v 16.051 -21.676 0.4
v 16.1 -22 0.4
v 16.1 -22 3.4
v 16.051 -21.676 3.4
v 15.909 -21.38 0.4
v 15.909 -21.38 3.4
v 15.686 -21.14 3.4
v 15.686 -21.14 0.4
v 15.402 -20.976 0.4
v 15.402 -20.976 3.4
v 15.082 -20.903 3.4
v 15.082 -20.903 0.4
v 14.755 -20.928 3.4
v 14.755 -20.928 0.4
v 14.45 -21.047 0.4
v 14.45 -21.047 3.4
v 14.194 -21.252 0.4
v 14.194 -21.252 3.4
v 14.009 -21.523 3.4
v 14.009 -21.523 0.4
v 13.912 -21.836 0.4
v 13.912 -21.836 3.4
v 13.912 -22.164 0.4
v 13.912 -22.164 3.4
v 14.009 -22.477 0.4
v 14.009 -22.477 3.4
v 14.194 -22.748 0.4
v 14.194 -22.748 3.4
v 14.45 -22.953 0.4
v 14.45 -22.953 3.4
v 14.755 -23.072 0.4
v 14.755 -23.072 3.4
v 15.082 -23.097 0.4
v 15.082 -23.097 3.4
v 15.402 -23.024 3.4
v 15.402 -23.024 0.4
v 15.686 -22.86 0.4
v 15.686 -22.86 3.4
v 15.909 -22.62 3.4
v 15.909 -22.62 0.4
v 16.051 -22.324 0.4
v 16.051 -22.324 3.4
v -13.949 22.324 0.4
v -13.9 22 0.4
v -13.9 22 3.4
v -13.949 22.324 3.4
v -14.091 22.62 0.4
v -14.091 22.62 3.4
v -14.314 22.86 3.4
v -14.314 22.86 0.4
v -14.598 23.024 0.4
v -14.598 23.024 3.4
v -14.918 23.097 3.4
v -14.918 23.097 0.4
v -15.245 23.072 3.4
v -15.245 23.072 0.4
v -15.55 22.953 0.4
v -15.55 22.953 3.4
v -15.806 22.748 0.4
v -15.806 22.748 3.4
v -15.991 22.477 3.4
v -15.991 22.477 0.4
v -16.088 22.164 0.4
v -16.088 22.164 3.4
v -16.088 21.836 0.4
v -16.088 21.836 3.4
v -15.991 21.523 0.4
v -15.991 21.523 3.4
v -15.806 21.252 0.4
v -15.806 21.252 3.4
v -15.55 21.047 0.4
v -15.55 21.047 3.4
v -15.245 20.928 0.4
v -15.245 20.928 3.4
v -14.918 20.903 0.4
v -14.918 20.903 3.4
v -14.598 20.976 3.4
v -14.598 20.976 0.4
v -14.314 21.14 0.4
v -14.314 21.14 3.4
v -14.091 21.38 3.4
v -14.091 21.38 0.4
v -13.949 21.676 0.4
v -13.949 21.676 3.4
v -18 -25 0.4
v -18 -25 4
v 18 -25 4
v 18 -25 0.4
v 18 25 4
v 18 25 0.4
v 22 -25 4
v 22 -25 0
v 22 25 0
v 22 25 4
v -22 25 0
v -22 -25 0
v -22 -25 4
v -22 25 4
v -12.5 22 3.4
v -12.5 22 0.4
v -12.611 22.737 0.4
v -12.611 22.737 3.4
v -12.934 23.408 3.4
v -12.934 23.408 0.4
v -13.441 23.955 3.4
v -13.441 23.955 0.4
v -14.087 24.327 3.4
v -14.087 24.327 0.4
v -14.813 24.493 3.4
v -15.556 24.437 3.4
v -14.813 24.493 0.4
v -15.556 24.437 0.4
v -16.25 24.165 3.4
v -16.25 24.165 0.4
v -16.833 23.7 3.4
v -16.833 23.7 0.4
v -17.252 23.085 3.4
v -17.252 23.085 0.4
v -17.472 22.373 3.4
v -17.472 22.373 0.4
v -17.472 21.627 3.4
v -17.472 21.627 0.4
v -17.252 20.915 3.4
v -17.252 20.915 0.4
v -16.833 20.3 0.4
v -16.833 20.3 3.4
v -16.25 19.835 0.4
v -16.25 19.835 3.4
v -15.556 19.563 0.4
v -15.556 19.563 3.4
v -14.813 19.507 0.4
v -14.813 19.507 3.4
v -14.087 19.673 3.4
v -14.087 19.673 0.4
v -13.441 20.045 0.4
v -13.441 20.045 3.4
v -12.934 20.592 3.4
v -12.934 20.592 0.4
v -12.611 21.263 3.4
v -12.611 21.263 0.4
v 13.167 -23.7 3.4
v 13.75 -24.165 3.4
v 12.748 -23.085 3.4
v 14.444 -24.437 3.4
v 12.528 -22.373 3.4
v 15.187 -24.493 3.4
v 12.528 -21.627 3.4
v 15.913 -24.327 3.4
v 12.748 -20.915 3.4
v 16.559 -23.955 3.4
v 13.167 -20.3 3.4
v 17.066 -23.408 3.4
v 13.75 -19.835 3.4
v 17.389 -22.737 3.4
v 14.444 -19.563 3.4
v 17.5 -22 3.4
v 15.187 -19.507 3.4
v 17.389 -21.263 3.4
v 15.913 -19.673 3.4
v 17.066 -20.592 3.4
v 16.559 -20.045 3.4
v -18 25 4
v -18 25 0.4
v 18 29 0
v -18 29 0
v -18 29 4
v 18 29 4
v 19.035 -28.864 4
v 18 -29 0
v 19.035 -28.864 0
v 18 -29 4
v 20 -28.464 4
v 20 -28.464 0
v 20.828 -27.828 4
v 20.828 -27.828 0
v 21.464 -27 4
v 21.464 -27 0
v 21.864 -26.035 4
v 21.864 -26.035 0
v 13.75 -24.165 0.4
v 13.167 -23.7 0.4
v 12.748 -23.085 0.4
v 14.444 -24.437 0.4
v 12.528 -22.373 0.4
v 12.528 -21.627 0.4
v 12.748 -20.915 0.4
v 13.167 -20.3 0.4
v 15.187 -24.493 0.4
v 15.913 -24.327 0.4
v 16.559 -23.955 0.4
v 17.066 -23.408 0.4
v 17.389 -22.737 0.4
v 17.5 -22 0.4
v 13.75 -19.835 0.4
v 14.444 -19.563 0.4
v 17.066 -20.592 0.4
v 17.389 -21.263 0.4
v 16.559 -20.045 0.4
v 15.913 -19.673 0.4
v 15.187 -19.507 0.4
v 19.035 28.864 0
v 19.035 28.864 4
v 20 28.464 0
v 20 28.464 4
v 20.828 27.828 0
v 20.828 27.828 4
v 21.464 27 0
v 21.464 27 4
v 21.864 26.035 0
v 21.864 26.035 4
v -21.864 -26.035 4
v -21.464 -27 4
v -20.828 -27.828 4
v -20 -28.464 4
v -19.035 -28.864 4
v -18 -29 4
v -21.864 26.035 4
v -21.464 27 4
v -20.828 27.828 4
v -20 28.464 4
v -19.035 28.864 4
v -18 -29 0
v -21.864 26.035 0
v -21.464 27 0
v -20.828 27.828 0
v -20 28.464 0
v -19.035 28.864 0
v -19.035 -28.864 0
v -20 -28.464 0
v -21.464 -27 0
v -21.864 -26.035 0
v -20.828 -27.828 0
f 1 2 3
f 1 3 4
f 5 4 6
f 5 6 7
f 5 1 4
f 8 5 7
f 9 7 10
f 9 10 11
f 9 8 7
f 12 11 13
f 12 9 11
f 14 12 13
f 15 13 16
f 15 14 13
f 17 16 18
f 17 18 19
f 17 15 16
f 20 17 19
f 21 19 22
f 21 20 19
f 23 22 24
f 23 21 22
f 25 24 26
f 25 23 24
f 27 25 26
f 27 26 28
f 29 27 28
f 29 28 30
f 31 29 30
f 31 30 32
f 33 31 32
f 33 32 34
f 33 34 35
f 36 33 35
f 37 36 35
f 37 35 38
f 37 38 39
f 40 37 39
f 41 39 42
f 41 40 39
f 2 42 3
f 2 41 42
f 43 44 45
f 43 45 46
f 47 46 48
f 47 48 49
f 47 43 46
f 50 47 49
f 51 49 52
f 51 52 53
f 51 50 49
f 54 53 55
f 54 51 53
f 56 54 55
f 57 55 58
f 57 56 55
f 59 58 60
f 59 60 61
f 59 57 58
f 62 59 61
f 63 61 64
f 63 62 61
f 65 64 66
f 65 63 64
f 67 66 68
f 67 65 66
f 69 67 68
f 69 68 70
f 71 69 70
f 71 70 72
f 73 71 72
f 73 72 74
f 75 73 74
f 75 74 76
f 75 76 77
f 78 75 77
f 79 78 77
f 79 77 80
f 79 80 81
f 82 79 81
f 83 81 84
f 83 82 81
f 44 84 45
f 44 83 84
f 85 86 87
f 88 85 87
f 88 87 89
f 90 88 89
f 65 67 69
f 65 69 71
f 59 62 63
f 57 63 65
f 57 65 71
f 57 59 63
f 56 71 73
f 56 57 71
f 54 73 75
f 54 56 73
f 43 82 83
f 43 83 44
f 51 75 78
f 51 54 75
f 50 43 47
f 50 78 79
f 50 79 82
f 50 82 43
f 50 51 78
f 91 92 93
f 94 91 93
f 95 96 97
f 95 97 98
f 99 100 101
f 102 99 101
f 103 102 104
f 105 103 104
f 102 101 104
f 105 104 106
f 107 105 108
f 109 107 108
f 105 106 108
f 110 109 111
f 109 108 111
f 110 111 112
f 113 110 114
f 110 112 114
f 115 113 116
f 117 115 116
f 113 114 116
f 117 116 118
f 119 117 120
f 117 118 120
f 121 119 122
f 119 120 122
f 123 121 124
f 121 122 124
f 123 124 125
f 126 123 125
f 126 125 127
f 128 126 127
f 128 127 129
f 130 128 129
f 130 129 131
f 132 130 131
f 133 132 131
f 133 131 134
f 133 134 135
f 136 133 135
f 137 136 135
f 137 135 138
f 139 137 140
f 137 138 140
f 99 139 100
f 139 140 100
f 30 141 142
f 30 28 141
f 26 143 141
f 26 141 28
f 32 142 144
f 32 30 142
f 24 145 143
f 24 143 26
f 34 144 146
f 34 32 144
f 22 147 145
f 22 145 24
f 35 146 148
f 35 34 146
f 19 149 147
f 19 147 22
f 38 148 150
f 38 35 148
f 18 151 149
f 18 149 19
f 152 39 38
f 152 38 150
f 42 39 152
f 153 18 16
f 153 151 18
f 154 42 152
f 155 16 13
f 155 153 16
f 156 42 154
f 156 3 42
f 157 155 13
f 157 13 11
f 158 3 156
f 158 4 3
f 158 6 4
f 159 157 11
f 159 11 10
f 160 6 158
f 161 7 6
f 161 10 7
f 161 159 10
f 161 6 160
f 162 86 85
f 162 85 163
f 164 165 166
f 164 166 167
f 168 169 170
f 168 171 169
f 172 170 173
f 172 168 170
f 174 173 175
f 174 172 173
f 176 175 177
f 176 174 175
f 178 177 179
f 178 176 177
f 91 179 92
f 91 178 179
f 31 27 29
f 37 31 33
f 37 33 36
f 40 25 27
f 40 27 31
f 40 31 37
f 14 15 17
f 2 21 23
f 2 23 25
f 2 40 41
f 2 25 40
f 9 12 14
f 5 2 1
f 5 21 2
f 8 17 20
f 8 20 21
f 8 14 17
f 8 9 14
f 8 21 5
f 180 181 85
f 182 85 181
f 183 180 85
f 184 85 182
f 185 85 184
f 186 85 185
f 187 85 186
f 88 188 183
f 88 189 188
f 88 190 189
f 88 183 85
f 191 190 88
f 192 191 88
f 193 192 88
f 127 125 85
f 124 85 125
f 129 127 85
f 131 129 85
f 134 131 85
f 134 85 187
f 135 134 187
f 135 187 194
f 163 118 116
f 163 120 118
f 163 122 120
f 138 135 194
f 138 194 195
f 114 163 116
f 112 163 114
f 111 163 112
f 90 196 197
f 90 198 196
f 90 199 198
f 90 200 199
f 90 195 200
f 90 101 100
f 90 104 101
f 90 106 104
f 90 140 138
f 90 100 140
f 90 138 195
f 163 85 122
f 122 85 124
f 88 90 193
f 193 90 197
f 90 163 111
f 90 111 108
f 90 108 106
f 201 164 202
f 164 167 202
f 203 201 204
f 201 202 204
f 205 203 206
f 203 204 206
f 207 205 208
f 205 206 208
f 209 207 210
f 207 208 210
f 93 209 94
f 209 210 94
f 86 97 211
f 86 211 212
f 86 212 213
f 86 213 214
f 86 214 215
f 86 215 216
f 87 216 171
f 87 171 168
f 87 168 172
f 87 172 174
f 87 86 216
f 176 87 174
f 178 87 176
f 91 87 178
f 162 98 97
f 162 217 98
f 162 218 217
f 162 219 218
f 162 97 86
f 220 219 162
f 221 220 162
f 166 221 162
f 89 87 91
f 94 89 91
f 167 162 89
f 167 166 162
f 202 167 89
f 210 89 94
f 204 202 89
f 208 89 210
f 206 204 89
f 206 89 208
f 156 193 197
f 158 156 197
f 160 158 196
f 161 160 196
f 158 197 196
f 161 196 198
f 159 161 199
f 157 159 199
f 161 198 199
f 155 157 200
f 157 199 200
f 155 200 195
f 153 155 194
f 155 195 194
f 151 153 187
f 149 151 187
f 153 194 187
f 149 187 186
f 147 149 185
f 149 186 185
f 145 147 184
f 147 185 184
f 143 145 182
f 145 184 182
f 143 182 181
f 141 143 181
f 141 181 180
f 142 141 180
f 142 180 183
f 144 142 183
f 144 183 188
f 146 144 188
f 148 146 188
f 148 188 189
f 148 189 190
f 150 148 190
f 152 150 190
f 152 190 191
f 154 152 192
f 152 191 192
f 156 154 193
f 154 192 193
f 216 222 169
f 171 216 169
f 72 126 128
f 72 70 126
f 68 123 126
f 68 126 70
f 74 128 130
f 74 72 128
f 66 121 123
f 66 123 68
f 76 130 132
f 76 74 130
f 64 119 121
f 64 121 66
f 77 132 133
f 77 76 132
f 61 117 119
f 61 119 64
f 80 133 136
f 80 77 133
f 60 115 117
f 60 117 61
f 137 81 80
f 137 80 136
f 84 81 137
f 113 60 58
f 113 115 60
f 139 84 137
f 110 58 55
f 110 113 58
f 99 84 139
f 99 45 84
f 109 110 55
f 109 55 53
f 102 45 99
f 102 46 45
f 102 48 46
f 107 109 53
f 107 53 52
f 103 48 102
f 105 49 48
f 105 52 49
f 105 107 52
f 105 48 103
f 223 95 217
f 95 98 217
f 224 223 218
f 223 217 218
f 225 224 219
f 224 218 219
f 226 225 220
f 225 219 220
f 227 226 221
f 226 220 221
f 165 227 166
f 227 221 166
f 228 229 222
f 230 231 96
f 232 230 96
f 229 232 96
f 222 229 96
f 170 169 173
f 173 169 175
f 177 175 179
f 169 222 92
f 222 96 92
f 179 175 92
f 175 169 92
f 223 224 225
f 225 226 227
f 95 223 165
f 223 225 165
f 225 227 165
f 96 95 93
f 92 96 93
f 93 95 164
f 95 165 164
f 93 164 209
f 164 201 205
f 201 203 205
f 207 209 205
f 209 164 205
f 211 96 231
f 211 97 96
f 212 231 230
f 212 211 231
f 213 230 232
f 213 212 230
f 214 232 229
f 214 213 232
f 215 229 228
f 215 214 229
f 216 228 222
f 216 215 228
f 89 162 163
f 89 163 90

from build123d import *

# Parameters (mm, degrees)
SKETCH_W      = 44
SKETCH_H      = 58
PAD_DEPTH     = 4
SKETCH001_W   = 36
SKETCH001_H   = 50
POCKET_DEPTH  = 3.6
SKETCH002_R   = 2.5
SKETCH002_R_2 = 1.1
PAD001_DEPTH  = 3
FILLET_R      = 4


with BuildPart() as part:
    # Sketch → Pad (new body)
    with BuildSketch(Plane.XY):
        Rectangle(SKETCH_W, SKETCH_H)
    extrude(amount=PAD_DEPTH)

    # Sketch001 (on Face6 of Pad) → Pocket (cut)
    with BuildSketch(Plane.XY.offset(4)):
        Rectangle(SKETCH001_W, SKETCH001_H)
    extrude(amount=-POCKET_DEPTH, mode=Mode.SUBTRACT)

    # Sketch002 (on Face11 of Pocket) → Pad001 (join)
    with BuildSketch(Plane.XY.offset(0.4)):
        with Locations((-15, 22)):
            Circle(SKETCH002_R)
        with Locations((-15, 22)):
            Circle(SKETCH002_R_2, mode=Mode.SUBTRACT)
        with Locations((15, -22)):
            Circle(SKETCH002_R)
        with Locations((15, -22)):
            Circle(SKETCH002_R_2, mode=Mode.SUBTRACT)
    extrude(amount=PAD001_DEPTH)

    # Fillet
    fillet_edges = [part.edges().sort_by_distance(p)[0] for p in [
        (-22, -29, 2),
        (22, -29, 2),
        (22, 29, 2),
        (-22, 29, 2),
    ]]
    fillet(fillet_edges, radius=FILLET_R)


solid = part.part
